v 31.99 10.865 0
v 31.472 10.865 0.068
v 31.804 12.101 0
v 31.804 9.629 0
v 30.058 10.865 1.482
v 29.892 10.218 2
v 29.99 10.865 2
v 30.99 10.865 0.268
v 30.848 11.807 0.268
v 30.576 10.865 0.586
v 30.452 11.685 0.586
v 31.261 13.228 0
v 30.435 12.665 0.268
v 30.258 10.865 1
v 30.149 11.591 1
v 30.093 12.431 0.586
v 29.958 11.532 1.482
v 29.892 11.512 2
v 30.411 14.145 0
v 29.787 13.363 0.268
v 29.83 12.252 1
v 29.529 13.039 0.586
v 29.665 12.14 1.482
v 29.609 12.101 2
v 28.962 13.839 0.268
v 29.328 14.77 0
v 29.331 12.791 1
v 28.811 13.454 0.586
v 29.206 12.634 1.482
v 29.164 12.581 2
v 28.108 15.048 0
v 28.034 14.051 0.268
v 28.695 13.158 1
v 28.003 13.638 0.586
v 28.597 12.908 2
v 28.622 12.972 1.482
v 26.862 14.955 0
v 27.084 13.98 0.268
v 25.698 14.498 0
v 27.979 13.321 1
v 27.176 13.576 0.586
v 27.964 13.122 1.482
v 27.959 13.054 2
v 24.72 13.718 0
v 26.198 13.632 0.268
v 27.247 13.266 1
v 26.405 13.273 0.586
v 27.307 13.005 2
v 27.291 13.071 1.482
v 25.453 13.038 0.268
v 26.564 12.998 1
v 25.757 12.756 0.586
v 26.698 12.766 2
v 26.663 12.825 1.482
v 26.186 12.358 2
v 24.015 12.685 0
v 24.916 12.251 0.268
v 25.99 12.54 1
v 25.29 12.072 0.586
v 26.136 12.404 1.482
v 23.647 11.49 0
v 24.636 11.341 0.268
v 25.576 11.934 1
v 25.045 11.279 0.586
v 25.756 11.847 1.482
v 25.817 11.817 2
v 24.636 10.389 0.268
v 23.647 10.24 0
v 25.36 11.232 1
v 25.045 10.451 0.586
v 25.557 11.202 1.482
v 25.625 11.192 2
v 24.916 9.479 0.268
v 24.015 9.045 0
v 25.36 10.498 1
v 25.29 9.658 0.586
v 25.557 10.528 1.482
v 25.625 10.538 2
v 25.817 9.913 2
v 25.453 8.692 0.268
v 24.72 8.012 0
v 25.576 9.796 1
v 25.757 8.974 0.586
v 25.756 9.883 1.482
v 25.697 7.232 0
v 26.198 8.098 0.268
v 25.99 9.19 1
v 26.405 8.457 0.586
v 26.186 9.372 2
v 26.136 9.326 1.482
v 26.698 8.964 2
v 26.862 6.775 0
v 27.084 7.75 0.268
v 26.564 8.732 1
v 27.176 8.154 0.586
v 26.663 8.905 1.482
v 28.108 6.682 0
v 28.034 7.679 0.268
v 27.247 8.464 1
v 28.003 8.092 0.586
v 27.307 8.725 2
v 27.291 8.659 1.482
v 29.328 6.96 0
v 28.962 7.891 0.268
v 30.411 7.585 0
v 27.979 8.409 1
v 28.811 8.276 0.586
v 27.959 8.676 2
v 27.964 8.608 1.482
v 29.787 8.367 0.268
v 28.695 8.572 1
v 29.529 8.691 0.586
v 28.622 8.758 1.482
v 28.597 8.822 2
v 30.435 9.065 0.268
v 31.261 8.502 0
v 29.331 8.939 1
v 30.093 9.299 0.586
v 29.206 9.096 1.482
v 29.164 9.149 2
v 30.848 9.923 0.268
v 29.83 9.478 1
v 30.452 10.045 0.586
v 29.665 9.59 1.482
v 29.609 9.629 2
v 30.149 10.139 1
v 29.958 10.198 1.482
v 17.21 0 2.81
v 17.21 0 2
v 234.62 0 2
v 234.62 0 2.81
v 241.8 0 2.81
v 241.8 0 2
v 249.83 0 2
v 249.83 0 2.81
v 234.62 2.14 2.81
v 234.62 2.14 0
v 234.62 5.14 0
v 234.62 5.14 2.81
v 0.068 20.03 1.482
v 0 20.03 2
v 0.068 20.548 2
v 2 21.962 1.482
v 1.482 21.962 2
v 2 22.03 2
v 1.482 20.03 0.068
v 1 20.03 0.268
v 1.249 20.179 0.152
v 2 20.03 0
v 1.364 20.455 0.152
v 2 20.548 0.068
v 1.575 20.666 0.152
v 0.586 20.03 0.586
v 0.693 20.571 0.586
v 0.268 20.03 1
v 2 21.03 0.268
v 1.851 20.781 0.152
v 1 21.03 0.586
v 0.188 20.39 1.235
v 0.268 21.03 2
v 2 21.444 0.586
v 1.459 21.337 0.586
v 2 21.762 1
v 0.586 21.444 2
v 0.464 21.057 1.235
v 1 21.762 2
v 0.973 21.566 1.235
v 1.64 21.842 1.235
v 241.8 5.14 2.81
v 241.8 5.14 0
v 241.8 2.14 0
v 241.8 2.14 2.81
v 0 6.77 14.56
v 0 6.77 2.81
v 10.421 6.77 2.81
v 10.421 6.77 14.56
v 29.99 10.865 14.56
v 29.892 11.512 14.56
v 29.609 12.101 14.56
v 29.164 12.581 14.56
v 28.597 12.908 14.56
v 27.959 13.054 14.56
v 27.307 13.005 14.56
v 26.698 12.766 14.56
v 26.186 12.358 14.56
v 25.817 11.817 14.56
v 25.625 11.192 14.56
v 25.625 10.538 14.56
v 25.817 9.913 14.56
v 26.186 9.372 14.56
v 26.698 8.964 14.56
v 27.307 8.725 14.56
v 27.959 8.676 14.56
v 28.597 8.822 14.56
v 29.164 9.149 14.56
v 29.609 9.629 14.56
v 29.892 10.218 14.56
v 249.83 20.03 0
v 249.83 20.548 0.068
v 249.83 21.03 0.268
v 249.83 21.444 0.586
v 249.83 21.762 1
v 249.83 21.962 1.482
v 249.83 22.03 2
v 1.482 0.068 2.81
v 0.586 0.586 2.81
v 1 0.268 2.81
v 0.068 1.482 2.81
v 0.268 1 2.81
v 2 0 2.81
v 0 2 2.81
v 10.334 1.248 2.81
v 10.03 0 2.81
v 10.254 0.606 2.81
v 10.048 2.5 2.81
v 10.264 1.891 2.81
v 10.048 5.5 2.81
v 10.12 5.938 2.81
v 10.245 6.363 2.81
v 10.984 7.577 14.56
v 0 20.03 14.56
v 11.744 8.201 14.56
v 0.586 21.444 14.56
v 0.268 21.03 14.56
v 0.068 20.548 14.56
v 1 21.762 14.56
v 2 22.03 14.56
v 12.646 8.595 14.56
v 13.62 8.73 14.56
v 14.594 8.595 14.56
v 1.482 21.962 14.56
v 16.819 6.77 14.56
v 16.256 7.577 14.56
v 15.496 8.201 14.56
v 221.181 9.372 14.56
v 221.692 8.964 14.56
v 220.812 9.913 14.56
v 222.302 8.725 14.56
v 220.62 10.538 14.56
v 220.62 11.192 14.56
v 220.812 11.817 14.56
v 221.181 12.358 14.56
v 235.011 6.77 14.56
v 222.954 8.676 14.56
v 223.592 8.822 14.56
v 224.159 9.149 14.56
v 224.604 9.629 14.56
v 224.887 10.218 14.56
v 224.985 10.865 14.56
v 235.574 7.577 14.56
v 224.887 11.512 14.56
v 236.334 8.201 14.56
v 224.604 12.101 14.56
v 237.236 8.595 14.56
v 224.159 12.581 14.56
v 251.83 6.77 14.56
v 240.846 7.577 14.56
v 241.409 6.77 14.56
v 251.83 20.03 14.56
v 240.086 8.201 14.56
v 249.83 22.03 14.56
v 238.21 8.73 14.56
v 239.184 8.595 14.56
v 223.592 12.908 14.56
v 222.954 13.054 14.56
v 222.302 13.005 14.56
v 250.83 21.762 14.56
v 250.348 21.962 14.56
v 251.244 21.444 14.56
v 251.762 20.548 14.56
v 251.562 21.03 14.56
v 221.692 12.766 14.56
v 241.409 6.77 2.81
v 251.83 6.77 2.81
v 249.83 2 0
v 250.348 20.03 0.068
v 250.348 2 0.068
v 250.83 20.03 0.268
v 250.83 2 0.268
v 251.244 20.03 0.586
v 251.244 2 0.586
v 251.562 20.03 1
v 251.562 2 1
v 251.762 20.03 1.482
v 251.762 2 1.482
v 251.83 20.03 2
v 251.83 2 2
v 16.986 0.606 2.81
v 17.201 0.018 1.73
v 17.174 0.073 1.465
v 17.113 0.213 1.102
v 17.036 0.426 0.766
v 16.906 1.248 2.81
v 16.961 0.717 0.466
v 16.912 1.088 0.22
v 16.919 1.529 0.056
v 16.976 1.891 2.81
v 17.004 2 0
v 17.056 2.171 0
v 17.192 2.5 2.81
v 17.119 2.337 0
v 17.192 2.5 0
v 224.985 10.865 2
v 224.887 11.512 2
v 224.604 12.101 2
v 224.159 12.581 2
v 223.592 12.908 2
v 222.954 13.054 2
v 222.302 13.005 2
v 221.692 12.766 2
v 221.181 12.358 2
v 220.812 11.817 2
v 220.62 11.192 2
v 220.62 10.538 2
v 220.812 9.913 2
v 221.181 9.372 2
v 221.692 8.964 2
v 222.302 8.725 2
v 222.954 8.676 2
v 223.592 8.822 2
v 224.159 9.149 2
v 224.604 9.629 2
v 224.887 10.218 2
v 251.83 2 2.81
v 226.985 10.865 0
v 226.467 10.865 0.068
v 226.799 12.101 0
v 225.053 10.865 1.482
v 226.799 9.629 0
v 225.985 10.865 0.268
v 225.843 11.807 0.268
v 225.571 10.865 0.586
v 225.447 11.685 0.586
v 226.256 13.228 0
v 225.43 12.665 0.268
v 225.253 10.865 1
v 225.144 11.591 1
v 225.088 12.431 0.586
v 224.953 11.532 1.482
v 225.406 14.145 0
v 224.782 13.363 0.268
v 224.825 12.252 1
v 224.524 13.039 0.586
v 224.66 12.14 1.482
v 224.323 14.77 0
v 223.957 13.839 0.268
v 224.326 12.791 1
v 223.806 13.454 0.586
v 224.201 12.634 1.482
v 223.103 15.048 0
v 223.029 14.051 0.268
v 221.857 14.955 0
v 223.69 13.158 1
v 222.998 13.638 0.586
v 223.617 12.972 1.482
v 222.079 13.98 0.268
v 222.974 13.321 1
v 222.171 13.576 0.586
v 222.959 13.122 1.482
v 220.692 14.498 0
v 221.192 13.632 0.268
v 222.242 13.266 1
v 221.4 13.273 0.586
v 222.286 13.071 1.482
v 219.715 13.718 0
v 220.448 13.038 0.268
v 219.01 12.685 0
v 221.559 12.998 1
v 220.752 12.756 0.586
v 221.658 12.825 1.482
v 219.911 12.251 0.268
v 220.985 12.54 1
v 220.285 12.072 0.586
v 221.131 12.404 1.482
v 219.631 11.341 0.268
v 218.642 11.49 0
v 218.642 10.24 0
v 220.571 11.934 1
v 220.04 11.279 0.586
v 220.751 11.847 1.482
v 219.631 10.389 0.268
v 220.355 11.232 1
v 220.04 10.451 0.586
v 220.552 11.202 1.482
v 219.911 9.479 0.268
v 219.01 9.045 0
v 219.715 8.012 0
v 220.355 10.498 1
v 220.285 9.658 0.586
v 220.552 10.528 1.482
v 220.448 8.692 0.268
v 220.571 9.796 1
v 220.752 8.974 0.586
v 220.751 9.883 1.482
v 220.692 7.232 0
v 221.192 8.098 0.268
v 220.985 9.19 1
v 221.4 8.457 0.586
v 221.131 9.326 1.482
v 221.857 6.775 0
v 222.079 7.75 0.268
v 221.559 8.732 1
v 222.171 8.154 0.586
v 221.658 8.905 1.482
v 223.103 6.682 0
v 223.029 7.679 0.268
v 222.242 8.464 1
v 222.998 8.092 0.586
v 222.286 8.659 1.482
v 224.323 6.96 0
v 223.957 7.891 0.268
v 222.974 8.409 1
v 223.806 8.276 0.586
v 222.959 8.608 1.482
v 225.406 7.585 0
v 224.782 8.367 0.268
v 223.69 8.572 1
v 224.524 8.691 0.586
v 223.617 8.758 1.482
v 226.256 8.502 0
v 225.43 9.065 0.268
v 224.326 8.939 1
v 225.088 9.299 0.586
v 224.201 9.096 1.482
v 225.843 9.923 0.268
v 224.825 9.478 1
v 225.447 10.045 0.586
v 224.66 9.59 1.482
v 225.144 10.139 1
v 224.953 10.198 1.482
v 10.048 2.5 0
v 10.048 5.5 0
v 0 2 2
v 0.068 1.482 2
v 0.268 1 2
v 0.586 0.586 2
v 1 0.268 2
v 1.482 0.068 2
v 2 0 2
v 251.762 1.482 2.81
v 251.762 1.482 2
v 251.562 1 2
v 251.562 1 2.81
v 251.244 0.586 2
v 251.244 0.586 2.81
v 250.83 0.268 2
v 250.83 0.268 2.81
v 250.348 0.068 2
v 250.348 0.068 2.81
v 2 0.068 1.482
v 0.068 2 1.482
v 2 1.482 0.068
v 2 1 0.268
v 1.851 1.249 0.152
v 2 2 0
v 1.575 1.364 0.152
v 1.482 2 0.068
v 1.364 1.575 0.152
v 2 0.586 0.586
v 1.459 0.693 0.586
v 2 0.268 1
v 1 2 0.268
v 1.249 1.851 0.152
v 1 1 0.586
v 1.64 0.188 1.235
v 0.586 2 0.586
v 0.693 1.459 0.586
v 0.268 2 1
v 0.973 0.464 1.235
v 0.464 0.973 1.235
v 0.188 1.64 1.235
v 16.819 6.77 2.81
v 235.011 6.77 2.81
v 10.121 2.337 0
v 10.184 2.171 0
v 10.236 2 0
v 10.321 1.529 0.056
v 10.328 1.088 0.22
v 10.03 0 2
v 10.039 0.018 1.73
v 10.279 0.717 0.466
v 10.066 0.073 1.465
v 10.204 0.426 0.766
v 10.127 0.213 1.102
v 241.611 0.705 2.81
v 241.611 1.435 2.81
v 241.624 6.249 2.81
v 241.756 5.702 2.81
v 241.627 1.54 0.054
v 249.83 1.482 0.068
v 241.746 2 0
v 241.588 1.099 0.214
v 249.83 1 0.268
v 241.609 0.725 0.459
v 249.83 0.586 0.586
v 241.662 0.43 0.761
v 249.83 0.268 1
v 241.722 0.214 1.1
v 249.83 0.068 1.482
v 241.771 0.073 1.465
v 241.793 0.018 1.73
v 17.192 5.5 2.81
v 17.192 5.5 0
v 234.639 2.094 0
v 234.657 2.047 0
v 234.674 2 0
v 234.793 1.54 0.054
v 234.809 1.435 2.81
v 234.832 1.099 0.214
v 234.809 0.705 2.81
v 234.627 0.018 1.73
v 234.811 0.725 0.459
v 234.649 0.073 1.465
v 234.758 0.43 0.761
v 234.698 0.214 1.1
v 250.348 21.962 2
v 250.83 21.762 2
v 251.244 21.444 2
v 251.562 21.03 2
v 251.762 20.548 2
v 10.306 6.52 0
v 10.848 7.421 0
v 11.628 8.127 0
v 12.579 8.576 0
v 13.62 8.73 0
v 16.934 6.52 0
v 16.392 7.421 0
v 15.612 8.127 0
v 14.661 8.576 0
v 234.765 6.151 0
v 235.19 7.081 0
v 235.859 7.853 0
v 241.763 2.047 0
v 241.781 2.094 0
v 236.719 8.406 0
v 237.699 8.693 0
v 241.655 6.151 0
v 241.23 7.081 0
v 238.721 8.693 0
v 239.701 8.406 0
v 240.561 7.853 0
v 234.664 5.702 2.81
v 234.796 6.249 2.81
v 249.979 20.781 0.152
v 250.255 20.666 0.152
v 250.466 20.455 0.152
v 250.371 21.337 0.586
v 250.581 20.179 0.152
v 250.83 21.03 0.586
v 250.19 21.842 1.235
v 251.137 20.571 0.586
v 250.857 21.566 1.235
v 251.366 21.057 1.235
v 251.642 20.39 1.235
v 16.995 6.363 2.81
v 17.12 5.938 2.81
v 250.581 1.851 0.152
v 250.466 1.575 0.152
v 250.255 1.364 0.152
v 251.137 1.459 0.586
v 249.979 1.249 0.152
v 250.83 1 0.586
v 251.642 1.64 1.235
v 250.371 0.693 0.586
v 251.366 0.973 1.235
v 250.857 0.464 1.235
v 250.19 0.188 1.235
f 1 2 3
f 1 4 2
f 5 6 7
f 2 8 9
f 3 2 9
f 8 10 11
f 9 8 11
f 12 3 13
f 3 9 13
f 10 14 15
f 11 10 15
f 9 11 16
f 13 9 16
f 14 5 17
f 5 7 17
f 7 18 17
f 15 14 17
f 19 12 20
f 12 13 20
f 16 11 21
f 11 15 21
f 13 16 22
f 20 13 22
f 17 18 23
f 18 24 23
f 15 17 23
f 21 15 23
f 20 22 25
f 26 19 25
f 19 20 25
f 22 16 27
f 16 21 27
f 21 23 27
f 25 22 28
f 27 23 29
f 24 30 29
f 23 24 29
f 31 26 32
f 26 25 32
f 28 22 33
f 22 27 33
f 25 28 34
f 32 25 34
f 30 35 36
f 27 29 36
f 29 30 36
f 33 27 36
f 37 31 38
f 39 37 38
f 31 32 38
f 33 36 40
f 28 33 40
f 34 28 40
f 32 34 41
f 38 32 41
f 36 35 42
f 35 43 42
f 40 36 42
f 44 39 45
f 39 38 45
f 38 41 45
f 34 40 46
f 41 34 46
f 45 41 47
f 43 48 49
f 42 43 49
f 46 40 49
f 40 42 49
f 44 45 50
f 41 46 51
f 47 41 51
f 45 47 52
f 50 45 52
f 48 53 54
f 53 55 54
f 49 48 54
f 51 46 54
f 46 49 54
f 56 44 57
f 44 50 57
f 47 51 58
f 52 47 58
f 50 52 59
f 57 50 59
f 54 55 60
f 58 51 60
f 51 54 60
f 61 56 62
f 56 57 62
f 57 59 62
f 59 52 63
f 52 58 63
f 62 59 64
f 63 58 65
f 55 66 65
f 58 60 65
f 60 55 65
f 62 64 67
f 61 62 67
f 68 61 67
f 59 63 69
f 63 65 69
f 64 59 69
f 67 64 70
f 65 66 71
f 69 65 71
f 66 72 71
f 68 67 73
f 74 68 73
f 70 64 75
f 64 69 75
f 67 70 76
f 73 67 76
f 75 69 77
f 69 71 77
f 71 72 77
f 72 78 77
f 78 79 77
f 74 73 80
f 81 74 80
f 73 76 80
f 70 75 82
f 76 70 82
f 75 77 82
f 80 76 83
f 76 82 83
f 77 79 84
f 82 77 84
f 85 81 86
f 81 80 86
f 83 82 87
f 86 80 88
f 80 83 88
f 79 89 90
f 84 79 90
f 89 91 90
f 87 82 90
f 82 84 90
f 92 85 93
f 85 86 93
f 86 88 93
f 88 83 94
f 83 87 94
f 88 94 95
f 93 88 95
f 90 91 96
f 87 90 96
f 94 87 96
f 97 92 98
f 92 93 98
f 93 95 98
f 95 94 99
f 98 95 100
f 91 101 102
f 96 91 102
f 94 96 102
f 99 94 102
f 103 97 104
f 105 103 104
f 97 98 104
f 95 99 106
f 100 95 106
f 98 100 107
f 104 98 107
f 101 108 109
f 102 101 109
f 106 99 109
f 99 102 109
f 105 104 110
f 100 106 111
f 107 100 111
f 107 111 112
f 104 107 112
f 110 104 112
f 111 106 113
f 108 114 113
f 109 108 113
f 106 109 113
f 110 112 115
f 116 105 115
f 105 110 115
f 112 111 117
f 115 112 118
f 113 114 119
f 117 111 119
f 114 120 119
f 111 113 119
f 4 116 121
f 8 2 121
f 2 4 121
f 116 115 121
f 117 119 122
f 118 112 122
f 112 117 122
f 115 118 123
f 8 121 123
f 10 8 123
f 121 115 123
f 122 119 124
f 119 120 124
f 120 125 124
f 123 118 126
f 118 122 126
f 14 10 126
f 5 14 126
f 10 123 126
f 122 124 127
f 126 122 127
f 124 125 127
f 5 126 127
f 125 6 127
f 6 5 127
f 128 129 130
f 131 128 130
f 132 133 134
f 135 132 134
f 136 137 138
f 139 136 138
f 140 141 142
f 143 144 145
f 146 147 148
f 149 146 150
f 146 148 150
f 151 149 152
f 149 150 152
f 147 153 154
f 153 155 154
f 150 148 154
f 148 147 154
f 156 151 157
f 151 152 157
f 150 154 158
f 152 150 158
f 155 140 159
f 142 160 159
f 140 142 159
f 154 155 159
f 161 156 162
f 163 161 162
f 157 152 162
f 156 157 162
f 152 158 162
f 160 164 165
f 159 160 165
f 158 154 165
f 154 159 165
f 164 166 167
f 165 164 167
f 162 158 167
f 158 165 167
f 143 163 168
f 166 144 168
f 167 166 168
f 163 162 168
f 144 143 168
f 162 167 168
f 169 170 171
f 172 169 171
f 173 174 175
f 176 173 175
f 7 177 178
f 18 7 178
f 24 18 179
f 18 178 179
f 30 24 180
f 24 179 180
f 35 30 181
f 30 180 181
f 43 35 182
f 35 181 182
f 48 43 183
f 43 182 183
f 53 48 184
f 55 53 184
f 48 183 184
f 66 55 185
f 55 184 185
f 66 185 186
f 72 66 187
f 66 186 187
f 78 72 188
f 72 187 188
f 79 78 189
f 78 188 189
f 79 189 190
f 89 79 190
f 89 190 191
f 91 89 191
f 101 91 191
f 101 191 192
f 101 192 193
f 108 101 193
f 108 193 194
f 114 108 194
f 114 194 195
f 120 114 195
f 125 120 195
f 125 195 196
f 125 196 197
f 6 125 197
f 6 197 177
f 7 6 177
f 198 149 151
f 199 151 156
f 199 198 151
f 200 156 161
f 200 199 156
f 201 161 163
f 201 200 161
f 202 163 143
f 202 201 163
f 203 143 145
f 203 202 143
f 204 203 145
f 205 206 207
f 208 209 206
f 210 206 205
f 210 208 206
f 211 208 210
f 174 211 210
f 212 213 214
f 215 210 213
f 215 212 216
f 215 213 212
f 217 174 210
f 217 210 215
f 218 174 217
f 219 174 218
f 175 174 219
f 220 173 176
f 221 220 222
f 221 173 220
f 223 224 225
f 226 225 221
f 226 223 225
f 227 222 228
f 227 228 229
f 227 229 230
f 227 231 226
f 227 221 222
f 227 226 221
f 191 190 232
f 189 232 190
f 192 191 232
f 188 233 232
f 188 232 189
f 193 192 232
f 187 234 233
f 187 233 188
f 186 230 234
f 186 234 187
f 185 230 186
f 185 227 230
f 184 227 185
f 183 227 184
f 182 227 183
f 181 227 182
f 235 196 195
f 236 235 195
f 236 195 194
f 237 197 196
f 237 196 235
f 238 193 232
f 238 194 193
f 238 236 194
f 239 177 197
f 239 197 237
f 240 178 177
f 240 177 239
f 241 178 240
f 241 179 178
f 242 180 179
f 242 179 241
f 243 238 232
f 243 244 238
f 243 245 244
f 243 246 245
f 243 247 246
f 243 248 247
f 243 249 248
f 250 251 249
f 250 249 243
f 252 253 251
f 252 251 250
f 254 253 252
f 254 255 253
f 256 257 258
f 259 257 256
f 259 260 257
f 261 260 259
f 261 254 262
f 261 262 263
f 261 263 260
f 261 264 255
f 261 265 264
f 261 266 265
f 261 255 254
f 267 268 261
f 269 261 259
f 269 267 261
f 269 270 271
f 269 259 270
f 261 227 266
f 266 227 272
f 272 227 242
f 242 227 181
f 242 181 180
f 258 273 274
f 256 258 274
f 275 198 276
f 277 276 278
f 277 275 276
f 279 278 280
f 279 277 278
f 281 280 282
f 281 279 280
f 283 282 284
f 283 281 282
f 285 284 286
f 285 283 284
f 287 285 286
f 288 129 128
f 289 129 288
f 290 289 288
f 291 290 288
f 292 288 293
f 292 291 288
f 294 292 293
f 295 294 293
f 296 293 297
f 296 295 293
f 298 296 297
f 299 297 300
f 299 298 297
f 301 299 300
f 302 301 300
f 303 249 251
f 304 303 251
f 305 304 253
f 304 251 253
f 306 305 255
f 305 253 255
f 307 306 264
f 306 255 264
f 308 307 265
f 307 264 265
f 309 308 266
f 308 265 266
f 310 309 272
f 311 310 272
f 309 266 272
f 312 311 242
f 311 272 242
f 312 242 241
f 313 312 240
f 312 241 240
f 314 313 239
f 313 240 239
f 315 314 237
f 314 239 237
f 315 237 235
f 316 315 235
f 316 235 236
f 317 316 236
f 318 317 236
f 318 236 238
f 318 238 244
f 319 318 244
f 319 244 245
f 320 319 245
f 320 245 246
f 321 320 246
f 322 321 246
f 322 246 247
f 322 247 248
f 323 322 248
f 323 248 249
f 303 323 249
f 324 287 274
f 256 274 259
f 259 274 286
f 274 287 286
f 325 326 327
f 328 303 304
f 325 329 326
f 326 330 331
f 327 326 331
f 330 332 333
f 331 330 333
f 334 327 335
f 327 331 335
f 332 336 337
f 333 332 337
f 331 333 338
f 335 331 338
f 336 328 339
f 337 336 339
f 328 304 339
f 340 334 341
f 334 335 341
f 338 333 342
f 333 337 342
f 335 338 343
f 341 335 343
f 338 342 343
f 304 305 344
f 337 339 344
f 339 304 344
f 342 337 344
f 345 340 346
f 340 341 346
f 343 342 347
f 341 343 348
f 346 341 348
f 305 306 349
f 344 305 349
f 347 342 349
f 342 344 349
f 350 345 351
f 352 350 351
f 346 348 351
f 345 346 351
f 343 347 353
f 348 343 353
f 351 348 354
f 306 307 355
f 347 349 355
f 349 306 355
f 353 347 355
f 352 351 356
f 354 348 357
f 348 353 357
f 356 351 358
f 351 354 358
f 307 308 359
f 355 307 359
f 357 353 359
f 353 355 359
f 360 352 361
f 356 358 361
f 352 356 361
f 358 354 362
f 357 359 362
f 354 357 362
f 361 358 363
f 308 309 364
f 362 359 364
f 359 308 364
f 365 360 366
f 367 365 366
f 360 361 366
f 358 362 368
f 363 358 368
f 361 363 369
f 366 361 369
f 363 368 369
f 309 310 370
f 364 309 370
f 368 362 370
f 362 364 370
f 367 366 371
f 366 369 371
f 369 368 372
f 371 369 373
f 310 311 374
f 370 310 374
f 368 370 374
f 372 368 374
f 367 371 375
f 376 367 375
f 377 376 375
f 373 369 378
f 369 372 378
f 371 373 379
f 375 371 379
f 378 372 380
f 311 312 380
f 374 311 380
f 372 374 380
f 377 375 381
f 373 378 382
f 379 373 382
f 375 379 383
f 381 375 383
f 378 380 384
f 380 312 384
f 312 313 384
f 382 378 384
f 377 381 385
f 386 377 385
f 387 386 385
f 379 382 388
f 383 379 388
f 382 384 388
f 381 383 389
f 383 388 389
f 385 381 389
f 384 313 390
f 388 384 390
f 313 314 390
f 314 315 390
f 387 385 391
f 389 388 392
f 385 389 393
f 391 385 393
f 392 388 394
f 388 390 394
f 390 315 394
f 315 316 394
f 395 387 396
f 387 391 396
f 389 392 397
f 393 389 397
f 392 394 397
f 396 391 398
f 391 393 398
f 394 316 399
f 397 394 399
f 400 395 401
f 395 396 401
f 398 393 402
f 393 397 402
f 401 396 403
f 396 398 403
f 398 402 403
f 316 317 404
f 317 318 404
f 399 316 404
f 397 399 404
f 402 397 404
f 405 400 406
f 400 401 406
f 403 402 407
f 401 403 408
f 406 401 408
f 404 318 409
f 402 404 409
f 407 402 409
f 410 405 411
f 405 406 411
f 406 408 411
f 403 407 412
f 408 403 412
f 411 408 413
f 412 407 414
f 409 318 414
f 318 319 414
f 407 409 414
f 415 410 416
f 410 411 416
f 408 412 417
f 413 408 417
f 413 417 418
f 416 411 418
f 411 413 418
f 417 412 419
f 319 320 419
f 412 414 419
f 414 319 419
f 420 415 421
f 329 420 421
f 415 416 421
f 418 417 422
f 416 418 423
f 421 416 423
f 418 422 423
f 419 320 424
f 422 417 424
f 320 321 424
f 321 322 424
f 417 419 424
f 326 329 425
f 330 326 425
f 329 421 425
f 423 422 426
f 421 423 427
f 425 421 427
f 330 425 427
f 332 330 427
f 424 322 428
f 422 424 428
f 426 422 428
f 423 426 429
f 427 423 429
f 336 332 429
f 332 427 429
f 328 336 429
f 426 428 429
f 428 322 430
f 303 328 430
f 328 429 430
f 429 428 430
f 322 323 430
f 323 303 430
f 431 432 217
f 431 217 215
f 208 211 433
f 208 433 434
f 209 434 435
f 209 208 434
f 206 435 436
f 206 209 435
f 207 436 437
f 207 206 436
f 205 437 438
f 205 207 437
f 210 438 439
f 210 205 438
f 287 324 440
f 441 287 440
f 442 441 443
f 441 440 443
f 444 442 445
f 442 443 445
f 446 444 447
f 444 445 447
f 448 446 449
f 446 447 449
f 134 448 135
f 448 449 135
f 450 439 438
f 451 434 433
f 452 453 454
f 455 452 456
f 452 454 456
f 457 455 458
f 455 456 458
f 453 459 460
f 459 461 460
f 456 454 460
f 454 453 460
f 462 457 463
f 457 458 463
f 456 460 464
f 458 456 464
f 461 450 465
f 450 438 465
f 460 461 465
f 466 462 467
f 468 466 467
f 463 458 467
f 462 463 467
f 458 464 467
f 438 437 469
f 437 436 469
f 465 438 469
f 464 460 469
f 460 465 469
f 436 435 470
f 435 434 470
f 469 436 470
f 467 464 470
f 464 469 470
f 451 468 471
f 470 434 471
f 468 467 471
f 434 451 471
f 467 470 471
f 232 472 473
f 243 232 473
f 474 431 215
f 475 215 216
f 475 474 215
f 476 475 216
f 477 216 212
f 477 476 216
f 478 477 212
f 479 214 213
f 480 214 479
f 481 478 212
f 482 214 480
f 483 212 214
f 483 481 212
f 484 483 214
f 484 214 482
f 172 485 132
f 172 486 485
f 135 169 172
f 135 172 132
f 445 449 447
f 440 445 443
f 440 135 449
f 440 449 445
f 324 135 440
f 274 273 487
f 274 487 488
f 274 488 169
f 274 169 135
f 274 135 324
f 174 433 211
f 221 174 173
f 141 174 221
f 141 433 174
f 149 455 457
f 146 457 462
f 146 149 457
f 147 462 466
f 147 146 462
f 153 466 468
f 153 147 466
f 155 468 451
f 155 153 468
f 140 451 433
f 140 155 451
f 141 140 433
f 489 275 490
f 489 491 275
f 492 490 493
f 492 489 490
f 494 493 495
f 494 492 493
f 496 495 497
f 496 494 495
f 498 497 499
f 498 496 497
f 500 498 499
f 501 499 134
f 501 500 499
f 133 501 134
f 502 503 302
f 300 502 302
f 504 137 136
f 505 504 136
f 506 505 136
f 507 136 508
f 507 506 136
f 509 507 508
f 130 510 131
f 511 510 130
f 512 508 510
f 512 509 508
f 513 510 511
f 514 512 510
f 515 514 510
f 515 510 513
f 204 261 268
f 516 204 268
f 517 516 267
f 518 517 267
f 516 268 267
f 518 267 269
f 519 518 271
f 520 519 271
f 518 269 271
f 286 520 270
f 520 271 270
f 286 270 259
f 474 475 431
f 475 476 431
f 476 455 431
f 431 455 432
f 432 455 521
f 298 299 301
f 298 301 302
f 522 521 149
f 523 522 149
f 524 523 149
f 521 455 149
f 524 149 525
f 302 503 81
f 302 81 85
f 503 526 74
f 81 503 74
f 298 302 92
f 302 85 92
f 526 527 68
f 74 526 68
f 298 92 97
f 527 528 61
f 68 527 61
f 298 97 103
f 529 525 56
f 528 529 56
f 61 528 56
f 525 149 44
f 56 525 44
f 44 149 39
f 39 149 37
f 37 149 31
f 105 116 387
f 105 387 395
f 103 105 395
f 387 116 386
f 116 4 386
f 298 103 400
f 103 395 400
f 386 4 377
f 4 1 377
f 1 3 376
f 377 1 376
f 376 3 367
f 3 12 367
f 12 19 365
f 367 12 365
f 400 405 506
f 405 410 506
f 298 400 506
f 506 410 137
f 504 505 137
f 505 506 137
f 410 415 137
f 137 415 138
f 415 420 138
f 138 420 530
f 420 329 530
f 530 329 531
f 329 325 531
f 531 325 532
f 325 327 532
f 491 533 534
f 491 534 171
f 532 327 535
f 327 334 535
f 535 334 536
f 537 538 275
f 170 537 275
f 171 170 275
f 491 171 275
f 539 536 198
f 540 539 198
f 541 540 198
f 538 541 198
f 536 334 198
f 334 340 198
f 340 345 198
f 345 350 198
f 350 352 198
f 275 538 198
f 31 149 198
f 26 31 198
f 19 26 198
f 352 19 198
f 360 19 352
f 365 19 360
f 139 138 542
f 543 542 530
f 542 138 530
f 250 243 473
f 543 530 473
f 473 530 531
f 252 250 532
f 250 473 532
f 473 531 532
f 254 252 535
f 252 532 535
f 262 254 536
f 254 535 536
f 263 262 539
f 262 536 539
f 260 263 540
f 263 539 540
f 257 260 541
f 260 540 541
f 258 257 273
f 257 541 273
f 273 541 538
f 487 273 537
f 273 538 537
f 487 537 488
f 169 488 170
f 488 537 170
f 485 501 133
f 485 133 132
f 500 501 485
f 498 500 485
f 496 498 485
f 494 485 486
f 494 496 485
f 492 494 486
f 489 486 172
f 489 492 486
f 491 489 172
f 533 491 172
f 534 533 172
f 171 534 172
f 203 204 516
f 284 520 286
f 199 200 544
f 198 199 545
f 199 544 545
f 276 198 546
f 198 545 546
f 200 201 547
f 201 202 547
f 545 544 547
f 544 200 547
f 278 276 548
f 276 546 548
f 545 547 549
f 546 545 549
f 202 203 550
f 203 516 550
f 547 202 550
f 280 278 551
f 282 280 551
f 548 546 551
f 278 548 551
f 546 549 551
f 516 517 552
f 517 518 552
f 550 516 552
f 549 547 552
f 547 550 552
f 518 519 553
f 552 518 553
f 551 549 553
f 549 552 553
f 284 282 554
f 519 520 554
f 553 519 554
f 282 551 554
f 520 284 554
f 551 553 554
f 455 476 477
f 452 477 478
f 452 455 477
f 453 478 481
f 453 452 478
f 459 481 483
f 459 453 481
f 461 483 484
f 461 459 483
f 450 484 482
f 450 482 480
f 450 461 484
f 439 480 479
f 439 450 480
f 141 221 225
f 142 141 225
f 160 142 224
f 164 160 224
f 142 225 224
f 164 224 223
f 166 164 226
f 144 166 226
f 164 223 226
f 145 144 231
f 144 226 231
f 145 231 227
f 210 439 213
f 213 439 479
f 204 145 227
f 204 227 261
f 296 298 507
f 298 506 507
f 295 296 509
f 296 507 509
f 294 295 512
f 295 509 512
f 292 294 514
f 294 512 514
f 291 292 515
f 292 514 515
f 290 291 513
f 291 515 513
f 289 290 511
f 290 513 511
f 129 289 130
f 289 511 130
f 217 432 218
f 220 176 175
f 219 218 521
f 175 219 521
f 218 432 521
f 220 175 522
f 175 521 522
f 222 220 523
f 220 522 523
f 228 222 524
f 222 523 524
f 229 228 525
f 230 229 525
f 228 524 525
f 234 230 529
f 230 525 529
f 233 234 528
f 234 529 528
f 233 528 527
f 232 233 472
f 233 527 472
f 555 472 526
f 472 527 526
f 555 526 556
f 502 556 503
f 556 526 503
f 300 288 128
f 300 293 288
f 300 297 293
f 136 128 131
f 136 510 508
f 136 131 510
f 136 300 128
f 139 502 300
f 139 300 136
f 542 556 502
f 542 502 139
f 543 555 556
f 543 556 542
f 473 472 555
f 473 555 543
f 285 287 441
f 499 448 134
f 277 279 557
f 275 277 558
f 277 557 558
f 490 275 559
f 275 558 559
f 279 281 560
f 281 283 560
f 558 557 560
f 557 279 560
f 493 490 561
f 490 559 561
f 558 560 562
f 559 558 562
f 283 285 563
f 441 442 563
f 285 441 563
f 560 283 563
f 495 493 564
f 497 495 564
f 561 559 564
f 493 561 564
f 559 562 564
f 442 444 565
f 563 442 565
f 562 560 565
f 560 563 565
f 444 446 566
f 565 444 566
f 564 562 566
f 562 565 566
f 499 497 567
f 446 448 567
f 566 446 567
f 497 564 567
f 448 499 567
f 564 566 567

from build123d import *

# Parameters (mm, degrees)
BOX001_W        = 251.83
BOX001_H        = 6.77
BOX001_DEPTH    = 11.75
BOX_W           = 251.83
BOX_H           = 22.03
BOX_DEPTH       = 14.56
SKETCH_R        = 2.195
POCKET_DEPTH    = 14.561
POCKET001_DEPTH = 14.561
FILLET_R        = 2
FILLET001_R     = 2
FILLET002_R     = 2


with BuildPart() as cubo001:
    # Box001 → Box001 (new body)
    with BuildSketch(Plane.XY.offset(2.81)):
        with Locations((125.915, 3.385)):
            Rectangle(BOX001_W, BOX001_H)
    extrude(amount=BOX001_DEPTH)


with BuildPart() as fillet002:
    # Box → Box (new body)
    with BuildSketch(Plane.XY):
        with Locations((125.915, 11.015)):
            Rectangle(BOX_W, BOX_H)
    extrude(amount=BOX_DEPTH)

    # Cut: cut Cubo001
    add(cubo001.part, mode=Mode.SUBTRACT)

    # Sketch (on Face5 of Cut) → Pocket (cut, through all)
    with BuildSketch(Plane.XY.offset(14.56)):
        with Locations((27.795, 10.865)):
            Circle(SKETCH_R)
        with Locations((222.79, 10.865)):
            Circle(SKETCH_R)
    extrude(amount=-POCKET_DEPTH, mode=Mode.SUBTRACT)

    # Sketch001 (on Face7 of Pocket) → Pocket001 (cut, through all)
    with BuildSketch(Plane(origin=(0, 0, 0), x_dir=(1, 0, 0), z_dir=(0, 0, -1))):
        with BuildLine():
            Line((10.048096, -5.5), (10.048096, -2.5))
            ThreePointArc((10.048096, -2.5), (10.333563, -1.247868), (10.03, 0))
            Line((17.21, 0), (10.03, 0))
            ThreePointArc((17.21, 0), (16.906437, -1.247868), (17.191904, -2.5))
            Line((17.191904, -5.5), (17.191904, -2.5))
            ThreePointArc((10.048096, -5.5), (13.62, -8.73), (17.191904, -5.5))
        make_face()
        with BuildLine():
            ThreePointArc((234.62, -5.14), (238.21, -8.73), (241.8, -5.14))
            Line((241.8, -5.14), (241.8, -2.14))
            ThreePointArc((241.8, 0), (241.587489, -1.07), (241.8, -2.14))
            Line((241.8, 0), (234.62, 0))
            ThreePointArc((234.62, -2.14), (234.832511, -1.07), (234.62, 0))
            Line((234.62, -2.14), (234.62, -5.14))
        make_face()
    extrude(amount=-POCKET001_DEPTH, mode=Mode.SUBTRACT)

    # Fillet
    fillet_edges = [fillet002.edges().sort_by_distance(p)[0] for p in [
        (0, 0, 1.405),
        (0, 22.03, 7.28),
        (251.83, 22.03, 7.28),
        (251.83, 0, 1.405),
    ]]
    fillet(fillet_edges, radius=FILLET_R)

    # Fillet001
    fillet001_edges = [fillet002.edges().sort_by_distance(p)[0] for p in [
        (220.595, 10.865, 0),
        (25.6, 10.865, 0),
    ]]
    fillet(fillet001_edges, radius=FILLET001_R)

    # Fillet002
    fillet002_edges = [fillet002.edges().sort_by_distance(p)[0] for p in [
        (125.915, 22.03, 0),
        (0, 11.015, 0),
        (251.83, 11.015, 0),
        (6.015, 0, 0),
        (245.815, 0, 0),
        (125.915, 0, 0),
    ]]
    fillet(fillet002_edges, radius=FILLET002_R)


solid = fillet002.part
